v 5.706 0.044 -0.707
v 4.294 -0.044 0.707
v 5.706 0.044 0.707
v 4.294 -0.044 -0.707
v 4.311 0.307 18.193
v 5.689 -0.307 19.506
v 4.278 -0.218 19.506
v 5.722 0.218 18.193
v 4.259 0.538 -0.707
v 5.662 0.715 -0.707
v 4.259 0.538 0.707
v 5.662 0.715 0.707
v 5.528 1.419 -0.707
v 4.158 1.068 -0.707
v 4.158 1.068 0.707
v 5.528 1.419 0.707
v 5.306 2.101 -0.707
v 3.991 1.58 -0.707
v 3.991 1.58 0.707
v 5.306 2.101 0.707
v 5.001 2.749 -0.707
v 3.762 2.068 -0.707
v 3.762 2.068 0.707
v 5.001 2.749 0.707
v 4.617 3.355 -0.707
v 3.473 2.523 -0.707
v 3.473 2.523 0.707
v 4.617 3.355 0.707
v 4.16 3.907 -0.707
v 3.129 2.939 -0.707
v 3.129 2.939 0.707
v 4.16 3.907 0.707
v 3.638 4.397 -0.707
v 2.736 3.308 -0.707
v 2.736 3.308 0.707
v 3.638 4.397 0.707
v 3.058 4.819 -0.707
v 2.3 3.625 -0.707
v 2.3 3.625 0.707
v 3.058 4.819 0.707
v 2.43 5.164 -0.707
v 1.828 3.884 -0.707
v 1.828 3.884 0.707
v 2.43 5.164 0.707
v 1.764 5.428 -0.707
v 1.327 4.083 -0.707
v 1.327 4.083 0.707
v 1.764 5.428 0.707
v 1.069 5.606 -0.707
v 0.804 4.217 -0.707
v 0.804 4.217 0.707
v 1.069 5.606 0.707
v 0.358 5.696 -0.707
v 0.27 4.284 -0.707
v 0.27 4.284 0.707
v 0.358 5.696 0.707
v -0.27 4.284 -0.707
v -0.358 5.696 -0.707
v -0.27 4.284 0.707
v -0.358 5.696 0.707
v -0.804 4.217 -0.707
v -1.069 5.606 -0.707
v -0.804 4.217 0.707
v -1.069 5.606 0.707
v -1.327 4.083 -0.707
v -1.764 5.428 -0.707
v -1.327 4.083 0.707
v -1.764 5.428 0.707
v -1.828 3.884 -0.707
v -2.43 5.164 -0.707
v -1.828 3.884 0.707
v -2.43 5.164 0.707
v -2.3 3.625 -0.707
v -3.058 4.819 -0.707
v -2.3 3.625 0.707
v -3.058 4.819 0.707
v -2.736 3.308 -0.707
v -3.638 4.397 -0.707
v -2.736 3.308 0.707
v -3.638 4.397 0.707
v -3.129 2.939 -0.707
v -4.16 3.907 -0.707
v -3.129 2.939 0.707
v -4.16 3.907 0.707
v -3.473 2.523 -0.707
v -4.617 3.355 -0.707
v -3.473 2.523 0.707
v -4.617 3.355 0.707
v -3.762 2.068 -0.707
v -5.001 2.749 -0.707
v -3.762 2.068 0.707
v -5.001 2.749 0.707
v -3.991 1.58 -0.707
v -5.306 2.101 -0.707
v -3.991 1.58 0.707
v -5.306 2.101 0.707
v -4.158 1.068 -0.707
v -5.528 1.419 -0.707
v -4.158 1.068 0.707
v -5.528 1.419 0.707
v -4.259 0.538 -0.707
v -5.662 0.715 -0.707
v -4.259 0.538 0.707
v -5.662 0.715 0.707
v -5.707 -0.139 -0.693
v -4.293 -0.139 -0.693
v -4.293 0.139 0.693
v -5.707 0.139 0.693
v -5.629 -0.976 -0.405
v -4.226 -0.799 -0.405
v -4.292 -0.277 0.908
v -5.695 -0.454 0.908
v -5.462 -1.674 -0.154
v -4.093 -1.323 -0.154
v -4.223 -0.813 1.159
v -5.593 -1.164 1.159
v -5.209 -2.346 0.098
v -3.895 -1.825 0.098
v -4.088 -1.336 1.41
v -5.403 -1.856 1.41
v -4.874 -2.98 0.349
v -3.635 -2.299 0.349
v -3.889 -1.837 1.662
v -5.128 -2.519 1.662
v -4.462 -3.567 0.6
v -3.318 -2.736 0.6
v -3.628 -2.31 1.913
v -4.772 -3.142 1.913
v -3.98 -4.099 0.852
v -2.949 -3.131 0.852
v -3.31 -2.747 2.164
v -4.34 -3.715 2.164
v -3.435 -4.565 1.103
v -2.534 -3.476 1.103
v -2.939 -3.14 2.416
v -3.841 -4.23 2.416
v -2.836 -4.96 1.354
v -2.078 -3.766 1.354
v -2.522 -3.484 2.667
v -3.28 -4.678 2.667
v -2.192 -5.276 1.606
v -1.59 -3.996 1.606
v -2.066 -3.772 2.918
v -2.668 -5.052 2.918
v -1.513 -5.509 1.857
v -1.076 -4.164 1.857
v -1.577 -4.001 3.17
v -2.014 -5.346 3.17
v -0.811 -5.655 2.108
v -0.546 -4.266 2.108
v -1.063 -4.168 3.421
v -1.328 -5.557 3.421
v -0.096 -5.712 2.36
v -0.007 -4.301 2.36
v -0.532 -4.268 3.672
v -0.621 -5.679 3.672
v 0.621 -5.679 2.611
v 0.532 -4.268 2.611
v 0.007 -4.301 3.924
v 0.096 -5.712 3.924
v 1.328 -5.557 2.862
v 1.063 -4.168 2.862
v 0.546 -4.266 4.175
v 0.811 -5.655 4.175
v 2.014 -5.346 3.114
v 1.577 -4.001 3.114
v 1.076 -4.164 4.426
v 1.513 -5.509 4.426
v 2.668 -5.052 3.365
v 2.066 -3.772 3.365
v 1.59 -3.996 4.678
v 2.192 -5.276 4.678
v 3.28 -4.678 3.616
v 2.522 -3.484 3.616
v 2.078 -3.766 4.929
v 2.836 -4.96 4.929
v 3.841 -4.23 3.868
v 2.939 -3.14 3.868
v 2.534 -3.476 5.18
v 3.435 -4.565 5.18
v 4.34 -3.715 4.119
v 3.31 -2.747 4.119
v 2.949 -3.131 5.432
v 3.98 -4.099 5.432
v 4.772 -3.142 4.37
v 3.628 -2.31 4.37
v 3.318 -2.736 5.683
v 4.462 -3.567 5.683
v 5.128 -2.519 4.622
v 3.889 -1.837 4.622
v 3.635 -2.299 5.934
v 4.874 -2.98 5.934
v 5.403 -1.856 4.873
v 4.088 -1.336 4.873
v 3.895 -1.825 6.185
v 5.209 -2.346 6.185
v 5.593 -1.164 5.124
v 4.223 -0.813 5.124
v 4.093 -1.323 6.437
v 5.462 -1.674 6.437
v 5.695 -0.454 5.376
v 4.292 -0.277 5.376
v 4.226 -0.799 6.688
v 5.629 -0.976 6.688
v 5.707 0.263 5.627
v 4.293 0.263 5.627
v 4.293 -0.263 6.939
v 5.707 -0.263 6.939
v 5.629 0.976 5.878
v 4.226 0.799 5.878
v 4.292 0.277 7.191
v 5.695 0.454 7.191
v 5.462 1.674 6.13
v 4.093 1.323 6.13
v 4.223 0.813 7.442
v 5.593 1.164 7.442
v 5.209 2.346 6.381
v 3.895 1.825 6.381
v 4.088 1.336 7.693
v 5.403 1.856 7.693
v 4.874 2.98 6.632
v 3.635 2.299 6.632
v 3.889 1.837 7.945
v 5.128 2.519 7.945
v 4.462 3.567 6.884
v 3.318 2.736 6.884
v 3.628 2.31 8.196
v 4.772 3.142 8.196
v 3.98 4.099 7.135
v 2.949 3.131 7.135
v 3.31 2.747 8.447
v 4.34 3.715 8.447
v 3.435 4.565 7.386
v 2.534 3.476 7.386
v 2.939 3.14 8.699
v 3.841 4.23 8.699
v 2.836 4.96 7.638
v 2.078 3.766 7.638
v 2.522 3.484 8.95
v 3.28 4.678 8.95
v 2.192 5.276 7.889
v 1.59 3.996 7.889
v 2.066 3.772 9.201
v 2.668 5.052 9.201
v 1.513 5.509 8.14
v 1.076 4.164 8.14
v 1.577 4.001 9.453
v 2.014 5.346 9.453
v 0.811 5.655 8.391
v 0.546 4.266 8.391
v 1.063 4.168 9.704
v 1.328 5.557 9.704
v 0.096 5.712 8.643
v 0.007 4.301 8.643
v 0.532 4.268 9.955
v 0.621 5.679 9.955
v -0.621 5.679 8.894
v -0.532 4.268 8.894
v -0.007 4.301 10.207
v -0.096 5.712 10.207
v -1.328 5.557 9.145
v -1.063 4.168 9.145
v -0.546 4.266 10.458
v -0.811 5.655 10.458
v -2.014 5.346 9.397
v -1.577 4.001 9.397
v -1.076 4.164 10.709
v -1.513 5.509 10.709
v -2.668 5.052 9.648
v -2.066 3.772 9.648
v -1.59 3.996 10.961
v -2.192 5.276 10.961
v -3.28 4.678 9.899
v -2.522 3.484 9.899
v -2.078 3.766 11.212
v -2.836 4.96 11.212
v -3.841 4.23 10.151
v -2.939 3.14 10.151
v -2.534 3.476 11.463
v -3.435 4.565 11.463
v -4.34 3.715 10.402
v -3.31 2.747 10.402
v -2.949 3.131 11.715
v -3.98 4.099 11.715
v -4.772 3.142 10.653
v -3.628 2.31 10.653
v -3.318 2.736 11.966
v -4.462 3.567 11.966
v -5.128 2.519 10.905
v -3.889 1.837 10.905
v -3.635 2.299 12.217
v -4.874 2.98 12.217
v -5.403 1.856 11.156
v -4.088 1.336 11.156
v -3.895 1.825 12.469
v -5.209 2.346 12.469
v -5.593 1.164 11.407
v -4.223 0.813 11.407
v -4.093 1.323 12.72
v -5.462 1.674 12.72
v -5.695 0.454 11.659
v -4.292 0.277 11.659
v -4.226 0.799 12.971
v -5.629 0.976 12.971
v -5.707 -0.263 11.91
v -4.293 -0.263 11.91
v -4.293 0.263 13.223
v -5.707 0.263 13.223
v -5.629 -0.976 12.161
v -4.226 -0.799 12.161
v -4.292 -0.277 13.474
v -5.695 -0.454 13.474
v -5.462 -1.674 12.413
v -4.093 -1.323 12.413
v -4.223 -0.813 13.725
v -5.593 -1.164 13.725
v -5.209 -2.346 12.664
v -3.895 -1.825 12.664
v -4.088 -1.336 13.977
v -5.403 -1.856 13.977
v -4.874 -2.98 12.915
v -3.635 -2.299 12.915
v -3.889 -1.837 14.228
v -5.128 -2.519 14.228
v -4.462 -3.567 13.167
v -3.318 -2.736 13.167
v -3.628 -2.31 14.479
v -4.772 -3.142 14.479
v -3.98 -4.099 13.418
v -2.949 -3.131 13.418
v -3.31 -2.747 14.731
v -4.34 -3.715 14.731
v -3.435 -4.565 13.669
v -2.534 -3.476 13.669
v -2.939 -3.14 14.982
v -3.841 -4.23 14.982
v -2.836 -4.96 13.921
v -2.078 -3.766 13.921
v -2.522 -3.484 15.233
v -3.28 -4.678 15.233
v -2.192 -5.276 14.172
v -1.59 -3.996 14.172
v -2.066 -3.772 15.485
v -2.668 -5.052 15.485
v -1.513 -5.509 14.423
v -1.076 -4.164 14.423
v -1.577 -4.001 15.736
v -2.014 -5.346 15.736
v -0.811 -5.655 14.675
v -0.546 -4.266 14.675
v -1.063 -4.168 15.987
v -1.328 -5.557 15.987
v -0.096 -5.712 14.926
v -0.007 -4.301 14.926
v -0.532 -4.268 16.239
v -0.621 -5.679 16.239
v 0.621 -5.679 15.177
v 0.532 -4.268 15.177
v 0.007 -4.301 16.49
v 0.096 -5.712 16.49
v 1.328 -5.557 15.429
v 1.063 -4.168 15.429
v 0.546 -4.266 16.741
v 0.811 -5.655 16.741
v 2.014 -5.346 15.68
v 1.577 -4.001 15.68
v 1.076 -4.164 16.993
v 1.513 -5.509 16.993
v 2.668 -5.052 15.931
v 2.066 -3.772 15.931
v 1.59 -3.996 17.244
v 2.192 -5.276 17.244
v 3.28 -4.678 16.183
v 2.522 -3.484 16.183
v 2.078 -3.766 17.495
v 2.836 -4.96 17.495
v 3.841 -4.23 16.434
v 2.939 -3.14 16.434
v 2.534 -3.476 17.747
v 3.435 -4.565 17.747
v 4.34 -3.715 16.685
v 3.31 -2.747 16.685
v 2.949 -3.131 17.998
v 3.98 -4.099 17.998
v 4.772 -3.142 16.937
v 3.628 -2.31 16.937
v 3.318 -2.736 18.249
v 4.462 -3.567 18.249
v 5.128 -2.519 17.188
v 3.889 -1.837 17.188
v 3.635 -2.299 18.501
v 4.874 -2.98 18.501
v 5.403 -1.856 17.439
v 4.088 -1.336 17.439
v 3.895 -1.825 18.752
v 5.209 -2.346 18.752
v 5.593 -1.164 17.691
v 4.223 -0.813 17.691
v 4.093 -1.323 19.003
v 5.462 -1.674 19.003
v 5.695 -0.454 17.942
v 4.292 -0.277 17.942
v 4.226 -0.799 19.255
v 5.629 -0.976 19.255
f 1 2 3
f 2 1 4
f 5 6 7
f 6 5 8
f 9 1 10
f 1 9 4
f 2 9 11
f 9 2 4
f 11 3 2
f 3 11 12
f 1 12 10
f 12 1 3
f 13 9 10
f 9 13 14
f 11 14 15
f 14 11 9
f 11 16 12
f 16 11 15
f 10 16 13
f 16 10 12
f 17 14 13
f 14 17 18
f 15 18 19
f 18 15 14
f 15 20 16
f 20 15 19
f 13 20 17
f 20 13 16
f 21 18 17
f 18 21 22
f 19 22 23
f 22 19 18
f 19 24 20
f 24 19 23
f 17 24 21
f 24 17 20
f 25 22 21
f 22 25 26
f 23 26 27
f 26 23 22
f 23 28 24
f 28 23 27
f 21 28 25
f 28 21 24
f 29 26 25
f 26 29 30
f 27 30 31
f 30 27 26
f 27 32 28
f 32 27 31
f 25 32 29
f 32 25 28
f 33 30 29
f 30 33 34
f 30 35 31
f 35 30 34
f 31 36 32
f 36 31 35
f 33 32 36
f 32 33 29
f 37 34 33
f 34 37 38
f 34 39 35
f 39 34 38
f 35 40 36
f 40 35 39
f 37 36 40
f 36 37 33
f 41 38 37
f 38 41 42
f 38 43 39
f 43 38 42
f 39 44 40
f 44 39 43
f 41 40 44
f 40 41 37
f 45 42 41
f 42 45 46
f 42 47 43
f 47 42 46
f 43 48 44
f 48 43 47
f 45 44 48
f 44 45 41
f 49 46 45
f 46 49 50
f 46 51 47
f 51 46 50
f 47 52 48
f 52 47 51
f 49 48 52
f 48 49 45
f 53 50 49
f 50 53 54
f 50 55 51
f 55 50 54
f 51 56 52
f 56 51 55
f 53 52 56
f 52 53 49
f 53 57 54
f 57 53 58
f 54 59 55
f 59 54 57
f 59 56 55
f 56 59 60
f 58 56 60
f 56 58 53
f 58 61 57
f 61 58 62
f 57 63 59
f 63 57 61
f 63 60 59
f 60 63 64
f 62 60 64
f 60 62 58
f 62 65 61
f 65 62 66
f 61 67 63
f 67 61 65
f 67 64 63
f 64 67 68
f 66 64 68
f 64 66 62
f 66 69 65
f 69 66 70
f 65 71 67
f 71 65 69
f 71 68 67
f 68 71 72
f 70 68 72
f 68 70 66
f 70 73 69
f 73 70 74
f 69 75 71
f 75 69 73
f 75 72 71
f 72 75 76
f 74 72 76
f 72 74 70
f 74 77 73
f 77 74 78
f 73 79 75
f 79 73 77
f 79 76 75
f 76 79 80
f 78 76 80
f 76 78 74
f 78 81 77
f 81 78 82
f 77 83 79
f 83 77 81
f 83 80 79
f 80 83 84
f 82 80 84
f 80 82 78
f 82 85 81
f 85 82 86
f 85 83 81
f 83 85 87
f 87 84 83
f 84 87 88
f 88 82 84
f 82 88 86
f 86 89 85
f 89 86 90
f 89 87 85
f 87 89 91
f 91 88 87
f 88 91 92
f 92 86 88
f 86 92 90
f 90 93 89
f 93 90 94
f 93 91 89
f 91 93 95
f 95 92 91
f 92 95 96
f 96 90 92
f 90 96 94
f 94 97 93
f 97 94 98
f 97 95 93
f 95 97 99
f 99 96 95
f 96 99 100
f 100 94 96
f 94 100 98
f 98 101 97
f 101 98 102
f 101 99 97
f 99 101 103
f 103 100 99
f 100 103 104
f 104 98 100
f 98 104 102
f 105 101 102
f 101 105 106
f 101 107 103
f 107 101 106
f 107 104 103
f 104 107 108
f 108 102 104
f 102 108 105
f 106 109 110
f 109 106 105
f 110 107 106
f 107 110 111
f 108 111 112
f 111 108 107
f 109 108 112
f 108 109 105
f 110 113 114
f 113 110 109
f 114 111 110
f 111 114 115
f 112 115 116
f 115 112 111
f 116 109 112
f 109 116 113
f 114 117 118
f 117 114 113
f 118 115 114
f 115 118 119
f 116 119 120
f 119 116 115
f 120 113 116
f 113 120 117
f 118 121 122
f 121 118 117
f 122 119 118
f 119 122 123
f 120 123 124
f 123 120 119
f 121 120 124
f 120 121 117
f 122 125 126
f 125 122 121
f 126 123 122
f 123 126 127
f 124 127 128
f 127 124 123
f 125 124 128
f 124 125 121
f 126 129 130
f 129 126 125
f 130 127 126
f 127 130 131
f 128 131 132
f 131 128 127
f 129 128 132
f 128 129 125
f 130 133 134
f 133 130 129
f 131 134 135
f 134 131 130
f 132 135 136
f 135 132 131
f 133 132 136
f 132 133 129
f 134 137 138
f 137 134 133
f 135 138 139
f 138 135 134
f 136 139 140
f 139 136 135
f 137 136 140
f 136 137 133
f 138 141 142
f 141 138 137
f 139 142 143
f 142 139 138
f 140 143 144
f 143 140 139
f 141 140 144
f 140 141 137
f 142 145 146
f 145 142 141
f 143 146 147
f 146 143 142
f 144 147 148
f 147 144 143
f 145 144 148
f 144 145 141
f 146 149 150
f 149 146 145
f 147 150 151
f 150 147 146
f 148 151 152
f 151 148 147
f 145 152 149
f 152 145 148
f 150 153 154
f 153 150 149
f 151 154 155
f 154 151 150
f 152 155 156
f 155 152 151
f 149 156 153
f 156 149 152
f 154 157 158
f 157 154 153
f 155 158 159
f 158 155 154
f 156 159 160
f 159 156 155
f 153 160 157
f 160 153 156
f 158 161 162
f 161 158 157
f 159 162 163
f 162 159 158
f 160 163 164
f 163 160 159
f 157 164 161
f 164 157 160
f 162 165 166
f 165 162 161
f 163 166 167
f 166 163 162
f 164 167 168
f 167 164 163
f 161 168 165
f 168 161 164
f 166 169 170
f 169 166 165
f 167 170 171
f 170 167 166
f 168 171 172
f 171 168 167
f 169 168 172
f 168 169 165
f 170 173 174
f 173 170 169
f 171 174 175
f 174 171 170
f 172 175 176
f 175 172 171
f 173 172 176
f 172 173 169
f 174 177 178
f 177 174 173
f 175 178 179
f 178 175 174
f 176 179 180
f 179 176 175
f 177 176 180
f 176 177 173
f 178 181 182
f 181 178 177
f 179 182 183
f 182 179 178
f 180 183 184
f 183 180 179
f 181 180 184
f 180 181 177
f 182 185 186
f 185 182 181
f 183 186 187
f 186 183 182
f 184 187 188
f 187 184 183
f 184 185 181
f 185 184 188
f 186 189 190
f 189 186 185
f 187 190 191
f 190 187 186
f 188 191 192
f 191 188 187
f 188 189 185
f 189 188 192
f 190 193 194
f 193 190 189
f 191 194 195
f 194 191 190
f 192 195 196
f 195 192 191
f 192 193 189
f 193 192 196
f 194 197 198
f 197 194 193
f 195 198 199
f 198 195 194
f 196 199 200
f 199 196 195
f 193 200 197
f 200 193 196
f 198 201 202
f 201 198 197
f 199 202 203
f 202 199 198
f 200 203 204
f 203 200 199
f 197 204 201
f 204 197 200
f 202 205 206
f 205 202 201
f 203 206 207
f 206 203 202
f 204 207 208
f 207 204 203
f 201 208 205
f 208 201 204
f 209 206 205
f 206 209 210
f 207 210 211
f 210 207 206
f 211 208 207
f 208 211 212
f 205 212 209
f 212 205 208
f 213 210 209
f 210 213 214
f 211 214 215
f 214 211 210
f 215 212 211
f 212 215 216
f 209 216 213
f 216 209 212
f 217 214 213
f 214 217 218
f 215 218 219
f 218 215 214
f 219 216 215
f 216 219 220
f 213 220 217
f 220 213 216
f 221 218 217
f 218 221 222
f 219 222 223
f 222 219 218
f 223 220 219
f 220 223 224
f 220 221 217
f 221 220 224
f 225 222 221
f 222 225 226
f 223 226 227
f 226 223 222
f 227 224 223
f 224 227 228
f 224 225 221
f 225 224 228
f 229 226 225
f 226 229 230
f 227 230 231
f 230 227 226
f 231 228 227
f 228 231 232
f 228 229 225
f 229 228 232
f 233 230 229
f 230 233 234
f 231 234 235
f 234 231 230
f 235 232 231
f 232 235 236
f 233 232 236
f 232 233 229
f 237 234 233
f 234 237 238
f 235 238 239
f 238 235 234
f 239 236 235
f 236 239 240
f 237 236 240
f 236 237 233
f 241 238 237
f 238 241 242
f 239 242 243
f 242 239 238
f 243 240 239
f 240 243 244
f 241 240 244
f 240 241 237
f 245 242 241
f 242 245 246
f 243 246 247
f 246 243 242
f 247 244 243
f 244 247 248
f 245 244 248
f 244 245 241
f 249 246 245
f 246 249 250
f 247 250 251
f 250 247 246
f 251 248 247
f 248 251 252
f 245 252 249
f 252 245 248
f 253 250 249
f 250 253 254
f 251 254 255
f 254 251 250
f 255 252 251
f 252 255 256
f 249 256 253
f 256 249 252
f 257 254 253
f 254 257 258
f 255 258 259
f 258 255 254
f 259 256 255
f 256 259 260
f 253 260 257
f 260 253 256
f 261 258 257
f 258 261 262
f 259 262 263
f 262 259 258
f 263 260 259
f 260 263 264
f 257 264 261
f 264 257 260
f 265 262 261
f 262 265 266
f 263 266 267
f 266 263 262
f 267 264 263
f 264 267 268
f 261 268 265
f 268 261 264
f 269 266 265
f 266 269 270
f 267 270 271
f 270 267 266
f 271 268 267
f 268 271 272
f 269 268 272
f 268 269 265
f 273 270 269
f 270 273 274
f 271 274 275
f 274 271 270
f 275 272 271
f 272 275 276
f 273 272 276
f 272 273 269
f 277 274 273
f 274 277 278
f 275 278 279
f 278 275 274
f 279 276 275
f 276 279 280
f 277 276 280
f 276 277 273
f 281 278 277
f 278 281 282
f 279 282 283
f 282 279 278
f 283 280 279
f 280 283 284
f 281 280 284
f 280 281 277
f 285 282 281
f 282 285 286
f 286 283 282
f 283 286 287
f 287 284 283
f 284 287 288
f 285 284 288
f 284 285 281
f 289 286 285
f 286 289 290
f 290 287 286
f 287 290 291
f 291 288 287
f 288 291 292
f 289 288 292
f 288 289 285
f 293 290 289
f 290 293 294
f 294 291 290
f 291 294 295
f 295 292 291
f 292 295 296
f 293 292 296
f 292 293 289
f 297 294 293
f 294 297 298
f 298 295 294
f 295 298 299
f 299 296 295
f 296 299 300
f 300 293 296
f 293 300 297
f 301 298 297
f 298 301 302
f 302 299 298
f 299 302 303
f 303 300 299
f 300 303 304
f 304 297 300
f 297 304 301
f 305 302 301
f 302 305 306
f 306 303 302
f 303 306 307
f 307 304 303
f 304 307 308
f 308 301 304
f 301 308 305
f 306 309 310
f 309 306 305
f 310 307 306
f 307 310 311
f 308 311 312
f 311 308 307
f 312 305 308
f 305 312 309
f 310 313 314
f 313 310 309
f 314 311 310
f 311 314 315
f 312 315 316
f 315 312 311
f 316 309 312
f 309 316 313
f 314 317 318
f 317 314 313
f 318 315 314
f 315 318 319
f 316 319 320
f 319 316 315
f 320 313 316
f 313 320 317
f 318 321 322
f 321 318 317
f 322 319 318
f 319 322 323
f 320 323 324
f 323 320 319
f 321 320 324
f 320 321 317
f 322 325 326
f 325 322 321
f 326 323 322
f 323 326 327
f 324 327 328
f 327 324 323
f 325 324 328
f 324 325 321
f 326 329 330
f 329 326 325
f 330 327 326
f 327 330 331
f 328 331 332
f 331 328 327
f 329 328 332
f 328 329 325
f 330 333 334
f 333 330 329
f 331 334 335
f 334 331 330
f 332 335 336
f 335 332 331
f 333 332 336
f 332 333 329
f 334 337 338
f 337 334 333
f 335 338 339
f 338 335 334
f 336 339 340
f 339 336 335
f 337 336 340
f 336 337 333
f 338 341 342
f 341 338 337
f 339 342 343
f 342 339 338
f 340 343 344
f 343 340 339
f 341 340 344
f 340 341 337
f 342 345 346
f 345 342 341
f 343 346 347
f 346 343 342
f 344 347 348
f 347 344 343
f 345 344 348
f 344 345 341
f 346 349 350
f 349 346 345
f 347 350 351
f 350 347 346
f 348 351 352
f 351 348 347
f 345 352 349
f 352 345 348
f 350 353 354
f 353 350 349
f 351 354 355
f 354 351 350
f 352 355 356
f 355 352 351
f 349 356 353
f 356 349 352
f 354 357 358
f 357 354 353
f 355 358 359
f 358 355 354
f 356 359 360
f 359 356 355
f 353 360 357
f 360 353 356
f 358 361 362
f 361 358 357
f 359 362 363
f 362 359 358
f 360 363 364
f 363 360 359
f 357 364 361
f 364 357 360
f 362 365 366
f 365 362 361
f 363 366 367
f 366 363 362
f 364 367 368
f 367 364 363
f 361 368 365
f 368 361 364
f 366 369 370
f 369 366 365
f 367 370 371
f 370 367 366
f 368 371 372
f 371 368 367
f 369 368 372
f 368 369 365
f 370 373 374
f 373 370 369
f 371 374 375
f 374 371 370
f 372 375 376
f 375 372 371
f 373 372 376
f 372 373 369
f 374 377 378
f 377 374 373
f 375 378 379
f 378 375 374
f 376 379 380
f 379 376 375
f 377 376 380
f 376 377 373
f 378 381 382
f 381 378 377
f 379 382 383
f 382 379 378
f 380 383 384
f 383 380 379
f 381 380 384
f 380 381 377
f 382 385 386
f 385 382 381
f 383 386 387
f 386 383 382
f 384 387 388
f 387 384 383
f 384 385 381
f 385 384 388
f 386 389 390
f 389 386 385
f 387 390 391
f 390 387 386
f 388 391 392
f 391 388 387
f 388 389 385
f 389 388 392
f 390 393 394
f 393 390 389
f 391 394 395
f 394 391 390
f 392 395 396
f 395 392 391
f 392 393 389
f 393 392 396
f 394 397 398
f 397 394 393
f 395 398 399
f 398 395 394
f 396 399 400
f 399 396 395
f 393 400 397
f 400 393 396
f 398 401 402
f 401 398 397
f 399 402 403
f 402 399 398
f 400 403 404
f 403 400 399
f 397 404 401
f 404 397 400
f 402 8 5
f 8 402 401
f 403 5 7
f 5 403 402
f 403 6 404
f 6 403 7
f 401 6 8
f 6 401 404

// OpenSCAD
// file: path_extrude.scad
// rotation matrix implementation
// OpenSCAD seems to do this slightly different from Wikipedia
// c.f. https://en.wikipedia.org/wiki/Rotation_matrix#Basic_rotations
function rot2Mat(rotVec, axis) =
    (len(rotVec) == 2) ?
        rot2Mat([rotVec[0], rotVec[1], 0], axis) :
    (axis == "x") ?
        [[1,              0,               0],
         [0, cos(rotVec[0]),  sin(rotVec[0])],
         [0, sin(rotVec[0]), -cos(rotVec[0])]] :
    (axis == "y") ?
        [[ cos(rotVec[1]), 0, sin(rotVec[1])],
         [              0, 1,              0],
         [-sin(rotVec[1]), 0, cos(rotVec[1])]] :
    (axis == "z") ?
        [[ cos(rotVec[2]), sin(rotVec[2]), 0],
         [-sin(rotVec[2]), cos(rotVec[2]), 0],
         [0,              0,               1]] : undef;

// convert point to 3D by setting Z to zero (if not present)
function c3D(tPoints) = 
    (len(tPoints[0]) < 3) ?
        tPoints * [[1,0,0],[0,1,0]] :
        tPoints;

// rotate [2D] points using a specificed XYZ rotation vector
function myRotate(rotation, points) =
    c3D(points) * rot2Mat(rotation, "x")
           * rot2Mat(rotation, "y")
           * rot2Mat(rotation, "z");    
    
// Determine spherical rotation for cartesian coordinates
function rToS(pt) = 
    [-acos((pt[2]) / norm(pt)), 
	 0, 
	 -atan2(pt[0],pt[1])];

// Generate a line between two points in 3D space
module line3D(p1,p2){
  translate((p1+p2)/2)
    rotate(rToS(p1-p2))
       cylinder(r=1, h=norm(p1-p2), center = true, $fn = 3);
}

// Flattens an array down one level (removing the enclosing array)
function flatten(pointArray, done=0, res=[]) =
    (done == len(pointArray)) ?
        res :
        flatten(pointArray=pointArray, done=done+1, 
            res=concat(res,pointArray[done]));

// Creates a polyhedron face
function phFace(pp, tp, base, add=0) =
    [base + add, (base+1) % pp + add,
     (((base+1) % pp) + pp + add) % tp, (base + pp + add) % tp];

function add(vecArg, scArg, res=[]) = 
    (len(res) >= len(vecArg)) ?
        res :
        add(vecArg, scArg, res=concat(res,[vecArg[len(res)]+scArg]));

// Generate an extruded polyhedron from an array of points
// boolean argument "closed" indicates whether to close up the 
// start and end polygon
module makeExtrudedPoly(ex, merge=false, trimEnds=false){
    ps = flatten(ex);
    pp = len(ex[1]); // points in one polygon
    tp = len(ex[1]) * len(ex); // total number of points
    if(!merge && !trimEnds){
        polyhedron(points=ps, faces=concat(
            [[for (i = [pp-1  : -1 :    0]) i]],
            [[for (i = [tp-pp :  1 : tp-1]) i]],
            [for (pt=[0:(len(ex)-2)])
                for(i = [0:pp-1]) phFace(pp,tp,i,pt*pp)],
            [])
        );
    } else if(trimEnds) {
        polyhedron(points=ps, faces=concat(
            [[for (i = [pp*2-1  : -1 :    pp]) i]],
            [[for (i = [tp-pp*2 :  1 : tp-pp-1]) i]],
            [for (pt=[1:(len(ex)-3)])
                for(i = [0:pp-1]) phFace(pp,tp,i,pt*pp)]));
    } else {
        polyhedron(points=ps, faces=
            [for (pt=[0:(len(ex)-1)])
                for(i = [0:pp-1]) phFace(pp,tp,i,pt*pp)]);
    }
}

// Extrude polygon along a path
module path_extrude(points, path, pos=0, merge=false, trimEnds=false, doRotate=true,
                    doScale=false, extruded=[]){
    if((len(points) > 0) && (len(path) > 0) && (len(points[0]) > 1)){
        if(len(extruded) >= (len(path))){
            // extrusion is finished, so construct the object
            //echo(extruded);
            makeExtrudedPoly(extruded, merge=merge, trimEnds=trimEnds);
        } else {
            sPoints = (doScale ? (points*doScale[pos]) : points );
            // generate points from rotating polygon
            if(merge || (pos < (len(path) - 1))){
                if((pos == 0) && (!merge)) {
                    newPts = (doRotate?(myRotate(rToS(path[1] - path[0]),sPoints)):c3D(sPoints));
                    path_extrude(points=points, path=path, pos=pos+1, 
                        merge=merge, trimEnds=trimEnds, doRotate=doRotate, doScale=doScale,
                        extruded=concat(extruded, [add(newPts,path[pos])]));
                } else {
                    newPts = (doRotate?(myRotate(rToS(path[(pos+1) % len(path)] 
                        - path[(pos+len(path)-1) % len(path)]),
                        sPoints)):c3D(sPoints));
                    path_extrude(points=points, path=path, pos=pos+1,
                        merge=merge, trimEnds=trimEnds, doRotate=doRotate, doScale=doScale,
                        extruded=concat(extruded, [add(newPts,path[pos])]));
                }
            } else {
                newPts = (doRotate?(myRotate(rToS(path[pos] - path[pos-1]),sPoints)):c3D(sPoints));
                path_extrude(points=points, path=path, pos=pos+1,
                    merge=merge, trimEnds=trimEnds, doRotate=doRotate, doScale=doScale,
                    extruded=concat(extruded, [add(newPts,path[pos])]));
            }
        }
    }
}

pi=3.14159;

myPoints = [ for(t = [0:72:359]) [cos(t+45),sin(t+45)] ];
myPath = [ for(t = [0:72:359]) 
    [5*cos(t),5*sin(t), 0] ];

path_extrude(points=myPoints, path=myPath, merge=true);

translate([0,0,4]) path_extrude(points=myPoints, path=myPath,
    merge=false);

translate([0,0,-4]) path_extrude(points=myPoints, path=myPath,
    merge=false, trimEnds=true);
// main file
use <path_extrude.scad>;

pi=3.14159;

myPoints = [ for(t = [0:90:359]) [cos(t+45),sin(t+45)] ];
myPath = [ for(t = [0:3.6:360]) 
    [5*cos(2*t),5*sin(2*t), (t<90)?0:((t-90) * 4*pi/180)] ];

path_extrude(points=myPoints, path=myPath);
